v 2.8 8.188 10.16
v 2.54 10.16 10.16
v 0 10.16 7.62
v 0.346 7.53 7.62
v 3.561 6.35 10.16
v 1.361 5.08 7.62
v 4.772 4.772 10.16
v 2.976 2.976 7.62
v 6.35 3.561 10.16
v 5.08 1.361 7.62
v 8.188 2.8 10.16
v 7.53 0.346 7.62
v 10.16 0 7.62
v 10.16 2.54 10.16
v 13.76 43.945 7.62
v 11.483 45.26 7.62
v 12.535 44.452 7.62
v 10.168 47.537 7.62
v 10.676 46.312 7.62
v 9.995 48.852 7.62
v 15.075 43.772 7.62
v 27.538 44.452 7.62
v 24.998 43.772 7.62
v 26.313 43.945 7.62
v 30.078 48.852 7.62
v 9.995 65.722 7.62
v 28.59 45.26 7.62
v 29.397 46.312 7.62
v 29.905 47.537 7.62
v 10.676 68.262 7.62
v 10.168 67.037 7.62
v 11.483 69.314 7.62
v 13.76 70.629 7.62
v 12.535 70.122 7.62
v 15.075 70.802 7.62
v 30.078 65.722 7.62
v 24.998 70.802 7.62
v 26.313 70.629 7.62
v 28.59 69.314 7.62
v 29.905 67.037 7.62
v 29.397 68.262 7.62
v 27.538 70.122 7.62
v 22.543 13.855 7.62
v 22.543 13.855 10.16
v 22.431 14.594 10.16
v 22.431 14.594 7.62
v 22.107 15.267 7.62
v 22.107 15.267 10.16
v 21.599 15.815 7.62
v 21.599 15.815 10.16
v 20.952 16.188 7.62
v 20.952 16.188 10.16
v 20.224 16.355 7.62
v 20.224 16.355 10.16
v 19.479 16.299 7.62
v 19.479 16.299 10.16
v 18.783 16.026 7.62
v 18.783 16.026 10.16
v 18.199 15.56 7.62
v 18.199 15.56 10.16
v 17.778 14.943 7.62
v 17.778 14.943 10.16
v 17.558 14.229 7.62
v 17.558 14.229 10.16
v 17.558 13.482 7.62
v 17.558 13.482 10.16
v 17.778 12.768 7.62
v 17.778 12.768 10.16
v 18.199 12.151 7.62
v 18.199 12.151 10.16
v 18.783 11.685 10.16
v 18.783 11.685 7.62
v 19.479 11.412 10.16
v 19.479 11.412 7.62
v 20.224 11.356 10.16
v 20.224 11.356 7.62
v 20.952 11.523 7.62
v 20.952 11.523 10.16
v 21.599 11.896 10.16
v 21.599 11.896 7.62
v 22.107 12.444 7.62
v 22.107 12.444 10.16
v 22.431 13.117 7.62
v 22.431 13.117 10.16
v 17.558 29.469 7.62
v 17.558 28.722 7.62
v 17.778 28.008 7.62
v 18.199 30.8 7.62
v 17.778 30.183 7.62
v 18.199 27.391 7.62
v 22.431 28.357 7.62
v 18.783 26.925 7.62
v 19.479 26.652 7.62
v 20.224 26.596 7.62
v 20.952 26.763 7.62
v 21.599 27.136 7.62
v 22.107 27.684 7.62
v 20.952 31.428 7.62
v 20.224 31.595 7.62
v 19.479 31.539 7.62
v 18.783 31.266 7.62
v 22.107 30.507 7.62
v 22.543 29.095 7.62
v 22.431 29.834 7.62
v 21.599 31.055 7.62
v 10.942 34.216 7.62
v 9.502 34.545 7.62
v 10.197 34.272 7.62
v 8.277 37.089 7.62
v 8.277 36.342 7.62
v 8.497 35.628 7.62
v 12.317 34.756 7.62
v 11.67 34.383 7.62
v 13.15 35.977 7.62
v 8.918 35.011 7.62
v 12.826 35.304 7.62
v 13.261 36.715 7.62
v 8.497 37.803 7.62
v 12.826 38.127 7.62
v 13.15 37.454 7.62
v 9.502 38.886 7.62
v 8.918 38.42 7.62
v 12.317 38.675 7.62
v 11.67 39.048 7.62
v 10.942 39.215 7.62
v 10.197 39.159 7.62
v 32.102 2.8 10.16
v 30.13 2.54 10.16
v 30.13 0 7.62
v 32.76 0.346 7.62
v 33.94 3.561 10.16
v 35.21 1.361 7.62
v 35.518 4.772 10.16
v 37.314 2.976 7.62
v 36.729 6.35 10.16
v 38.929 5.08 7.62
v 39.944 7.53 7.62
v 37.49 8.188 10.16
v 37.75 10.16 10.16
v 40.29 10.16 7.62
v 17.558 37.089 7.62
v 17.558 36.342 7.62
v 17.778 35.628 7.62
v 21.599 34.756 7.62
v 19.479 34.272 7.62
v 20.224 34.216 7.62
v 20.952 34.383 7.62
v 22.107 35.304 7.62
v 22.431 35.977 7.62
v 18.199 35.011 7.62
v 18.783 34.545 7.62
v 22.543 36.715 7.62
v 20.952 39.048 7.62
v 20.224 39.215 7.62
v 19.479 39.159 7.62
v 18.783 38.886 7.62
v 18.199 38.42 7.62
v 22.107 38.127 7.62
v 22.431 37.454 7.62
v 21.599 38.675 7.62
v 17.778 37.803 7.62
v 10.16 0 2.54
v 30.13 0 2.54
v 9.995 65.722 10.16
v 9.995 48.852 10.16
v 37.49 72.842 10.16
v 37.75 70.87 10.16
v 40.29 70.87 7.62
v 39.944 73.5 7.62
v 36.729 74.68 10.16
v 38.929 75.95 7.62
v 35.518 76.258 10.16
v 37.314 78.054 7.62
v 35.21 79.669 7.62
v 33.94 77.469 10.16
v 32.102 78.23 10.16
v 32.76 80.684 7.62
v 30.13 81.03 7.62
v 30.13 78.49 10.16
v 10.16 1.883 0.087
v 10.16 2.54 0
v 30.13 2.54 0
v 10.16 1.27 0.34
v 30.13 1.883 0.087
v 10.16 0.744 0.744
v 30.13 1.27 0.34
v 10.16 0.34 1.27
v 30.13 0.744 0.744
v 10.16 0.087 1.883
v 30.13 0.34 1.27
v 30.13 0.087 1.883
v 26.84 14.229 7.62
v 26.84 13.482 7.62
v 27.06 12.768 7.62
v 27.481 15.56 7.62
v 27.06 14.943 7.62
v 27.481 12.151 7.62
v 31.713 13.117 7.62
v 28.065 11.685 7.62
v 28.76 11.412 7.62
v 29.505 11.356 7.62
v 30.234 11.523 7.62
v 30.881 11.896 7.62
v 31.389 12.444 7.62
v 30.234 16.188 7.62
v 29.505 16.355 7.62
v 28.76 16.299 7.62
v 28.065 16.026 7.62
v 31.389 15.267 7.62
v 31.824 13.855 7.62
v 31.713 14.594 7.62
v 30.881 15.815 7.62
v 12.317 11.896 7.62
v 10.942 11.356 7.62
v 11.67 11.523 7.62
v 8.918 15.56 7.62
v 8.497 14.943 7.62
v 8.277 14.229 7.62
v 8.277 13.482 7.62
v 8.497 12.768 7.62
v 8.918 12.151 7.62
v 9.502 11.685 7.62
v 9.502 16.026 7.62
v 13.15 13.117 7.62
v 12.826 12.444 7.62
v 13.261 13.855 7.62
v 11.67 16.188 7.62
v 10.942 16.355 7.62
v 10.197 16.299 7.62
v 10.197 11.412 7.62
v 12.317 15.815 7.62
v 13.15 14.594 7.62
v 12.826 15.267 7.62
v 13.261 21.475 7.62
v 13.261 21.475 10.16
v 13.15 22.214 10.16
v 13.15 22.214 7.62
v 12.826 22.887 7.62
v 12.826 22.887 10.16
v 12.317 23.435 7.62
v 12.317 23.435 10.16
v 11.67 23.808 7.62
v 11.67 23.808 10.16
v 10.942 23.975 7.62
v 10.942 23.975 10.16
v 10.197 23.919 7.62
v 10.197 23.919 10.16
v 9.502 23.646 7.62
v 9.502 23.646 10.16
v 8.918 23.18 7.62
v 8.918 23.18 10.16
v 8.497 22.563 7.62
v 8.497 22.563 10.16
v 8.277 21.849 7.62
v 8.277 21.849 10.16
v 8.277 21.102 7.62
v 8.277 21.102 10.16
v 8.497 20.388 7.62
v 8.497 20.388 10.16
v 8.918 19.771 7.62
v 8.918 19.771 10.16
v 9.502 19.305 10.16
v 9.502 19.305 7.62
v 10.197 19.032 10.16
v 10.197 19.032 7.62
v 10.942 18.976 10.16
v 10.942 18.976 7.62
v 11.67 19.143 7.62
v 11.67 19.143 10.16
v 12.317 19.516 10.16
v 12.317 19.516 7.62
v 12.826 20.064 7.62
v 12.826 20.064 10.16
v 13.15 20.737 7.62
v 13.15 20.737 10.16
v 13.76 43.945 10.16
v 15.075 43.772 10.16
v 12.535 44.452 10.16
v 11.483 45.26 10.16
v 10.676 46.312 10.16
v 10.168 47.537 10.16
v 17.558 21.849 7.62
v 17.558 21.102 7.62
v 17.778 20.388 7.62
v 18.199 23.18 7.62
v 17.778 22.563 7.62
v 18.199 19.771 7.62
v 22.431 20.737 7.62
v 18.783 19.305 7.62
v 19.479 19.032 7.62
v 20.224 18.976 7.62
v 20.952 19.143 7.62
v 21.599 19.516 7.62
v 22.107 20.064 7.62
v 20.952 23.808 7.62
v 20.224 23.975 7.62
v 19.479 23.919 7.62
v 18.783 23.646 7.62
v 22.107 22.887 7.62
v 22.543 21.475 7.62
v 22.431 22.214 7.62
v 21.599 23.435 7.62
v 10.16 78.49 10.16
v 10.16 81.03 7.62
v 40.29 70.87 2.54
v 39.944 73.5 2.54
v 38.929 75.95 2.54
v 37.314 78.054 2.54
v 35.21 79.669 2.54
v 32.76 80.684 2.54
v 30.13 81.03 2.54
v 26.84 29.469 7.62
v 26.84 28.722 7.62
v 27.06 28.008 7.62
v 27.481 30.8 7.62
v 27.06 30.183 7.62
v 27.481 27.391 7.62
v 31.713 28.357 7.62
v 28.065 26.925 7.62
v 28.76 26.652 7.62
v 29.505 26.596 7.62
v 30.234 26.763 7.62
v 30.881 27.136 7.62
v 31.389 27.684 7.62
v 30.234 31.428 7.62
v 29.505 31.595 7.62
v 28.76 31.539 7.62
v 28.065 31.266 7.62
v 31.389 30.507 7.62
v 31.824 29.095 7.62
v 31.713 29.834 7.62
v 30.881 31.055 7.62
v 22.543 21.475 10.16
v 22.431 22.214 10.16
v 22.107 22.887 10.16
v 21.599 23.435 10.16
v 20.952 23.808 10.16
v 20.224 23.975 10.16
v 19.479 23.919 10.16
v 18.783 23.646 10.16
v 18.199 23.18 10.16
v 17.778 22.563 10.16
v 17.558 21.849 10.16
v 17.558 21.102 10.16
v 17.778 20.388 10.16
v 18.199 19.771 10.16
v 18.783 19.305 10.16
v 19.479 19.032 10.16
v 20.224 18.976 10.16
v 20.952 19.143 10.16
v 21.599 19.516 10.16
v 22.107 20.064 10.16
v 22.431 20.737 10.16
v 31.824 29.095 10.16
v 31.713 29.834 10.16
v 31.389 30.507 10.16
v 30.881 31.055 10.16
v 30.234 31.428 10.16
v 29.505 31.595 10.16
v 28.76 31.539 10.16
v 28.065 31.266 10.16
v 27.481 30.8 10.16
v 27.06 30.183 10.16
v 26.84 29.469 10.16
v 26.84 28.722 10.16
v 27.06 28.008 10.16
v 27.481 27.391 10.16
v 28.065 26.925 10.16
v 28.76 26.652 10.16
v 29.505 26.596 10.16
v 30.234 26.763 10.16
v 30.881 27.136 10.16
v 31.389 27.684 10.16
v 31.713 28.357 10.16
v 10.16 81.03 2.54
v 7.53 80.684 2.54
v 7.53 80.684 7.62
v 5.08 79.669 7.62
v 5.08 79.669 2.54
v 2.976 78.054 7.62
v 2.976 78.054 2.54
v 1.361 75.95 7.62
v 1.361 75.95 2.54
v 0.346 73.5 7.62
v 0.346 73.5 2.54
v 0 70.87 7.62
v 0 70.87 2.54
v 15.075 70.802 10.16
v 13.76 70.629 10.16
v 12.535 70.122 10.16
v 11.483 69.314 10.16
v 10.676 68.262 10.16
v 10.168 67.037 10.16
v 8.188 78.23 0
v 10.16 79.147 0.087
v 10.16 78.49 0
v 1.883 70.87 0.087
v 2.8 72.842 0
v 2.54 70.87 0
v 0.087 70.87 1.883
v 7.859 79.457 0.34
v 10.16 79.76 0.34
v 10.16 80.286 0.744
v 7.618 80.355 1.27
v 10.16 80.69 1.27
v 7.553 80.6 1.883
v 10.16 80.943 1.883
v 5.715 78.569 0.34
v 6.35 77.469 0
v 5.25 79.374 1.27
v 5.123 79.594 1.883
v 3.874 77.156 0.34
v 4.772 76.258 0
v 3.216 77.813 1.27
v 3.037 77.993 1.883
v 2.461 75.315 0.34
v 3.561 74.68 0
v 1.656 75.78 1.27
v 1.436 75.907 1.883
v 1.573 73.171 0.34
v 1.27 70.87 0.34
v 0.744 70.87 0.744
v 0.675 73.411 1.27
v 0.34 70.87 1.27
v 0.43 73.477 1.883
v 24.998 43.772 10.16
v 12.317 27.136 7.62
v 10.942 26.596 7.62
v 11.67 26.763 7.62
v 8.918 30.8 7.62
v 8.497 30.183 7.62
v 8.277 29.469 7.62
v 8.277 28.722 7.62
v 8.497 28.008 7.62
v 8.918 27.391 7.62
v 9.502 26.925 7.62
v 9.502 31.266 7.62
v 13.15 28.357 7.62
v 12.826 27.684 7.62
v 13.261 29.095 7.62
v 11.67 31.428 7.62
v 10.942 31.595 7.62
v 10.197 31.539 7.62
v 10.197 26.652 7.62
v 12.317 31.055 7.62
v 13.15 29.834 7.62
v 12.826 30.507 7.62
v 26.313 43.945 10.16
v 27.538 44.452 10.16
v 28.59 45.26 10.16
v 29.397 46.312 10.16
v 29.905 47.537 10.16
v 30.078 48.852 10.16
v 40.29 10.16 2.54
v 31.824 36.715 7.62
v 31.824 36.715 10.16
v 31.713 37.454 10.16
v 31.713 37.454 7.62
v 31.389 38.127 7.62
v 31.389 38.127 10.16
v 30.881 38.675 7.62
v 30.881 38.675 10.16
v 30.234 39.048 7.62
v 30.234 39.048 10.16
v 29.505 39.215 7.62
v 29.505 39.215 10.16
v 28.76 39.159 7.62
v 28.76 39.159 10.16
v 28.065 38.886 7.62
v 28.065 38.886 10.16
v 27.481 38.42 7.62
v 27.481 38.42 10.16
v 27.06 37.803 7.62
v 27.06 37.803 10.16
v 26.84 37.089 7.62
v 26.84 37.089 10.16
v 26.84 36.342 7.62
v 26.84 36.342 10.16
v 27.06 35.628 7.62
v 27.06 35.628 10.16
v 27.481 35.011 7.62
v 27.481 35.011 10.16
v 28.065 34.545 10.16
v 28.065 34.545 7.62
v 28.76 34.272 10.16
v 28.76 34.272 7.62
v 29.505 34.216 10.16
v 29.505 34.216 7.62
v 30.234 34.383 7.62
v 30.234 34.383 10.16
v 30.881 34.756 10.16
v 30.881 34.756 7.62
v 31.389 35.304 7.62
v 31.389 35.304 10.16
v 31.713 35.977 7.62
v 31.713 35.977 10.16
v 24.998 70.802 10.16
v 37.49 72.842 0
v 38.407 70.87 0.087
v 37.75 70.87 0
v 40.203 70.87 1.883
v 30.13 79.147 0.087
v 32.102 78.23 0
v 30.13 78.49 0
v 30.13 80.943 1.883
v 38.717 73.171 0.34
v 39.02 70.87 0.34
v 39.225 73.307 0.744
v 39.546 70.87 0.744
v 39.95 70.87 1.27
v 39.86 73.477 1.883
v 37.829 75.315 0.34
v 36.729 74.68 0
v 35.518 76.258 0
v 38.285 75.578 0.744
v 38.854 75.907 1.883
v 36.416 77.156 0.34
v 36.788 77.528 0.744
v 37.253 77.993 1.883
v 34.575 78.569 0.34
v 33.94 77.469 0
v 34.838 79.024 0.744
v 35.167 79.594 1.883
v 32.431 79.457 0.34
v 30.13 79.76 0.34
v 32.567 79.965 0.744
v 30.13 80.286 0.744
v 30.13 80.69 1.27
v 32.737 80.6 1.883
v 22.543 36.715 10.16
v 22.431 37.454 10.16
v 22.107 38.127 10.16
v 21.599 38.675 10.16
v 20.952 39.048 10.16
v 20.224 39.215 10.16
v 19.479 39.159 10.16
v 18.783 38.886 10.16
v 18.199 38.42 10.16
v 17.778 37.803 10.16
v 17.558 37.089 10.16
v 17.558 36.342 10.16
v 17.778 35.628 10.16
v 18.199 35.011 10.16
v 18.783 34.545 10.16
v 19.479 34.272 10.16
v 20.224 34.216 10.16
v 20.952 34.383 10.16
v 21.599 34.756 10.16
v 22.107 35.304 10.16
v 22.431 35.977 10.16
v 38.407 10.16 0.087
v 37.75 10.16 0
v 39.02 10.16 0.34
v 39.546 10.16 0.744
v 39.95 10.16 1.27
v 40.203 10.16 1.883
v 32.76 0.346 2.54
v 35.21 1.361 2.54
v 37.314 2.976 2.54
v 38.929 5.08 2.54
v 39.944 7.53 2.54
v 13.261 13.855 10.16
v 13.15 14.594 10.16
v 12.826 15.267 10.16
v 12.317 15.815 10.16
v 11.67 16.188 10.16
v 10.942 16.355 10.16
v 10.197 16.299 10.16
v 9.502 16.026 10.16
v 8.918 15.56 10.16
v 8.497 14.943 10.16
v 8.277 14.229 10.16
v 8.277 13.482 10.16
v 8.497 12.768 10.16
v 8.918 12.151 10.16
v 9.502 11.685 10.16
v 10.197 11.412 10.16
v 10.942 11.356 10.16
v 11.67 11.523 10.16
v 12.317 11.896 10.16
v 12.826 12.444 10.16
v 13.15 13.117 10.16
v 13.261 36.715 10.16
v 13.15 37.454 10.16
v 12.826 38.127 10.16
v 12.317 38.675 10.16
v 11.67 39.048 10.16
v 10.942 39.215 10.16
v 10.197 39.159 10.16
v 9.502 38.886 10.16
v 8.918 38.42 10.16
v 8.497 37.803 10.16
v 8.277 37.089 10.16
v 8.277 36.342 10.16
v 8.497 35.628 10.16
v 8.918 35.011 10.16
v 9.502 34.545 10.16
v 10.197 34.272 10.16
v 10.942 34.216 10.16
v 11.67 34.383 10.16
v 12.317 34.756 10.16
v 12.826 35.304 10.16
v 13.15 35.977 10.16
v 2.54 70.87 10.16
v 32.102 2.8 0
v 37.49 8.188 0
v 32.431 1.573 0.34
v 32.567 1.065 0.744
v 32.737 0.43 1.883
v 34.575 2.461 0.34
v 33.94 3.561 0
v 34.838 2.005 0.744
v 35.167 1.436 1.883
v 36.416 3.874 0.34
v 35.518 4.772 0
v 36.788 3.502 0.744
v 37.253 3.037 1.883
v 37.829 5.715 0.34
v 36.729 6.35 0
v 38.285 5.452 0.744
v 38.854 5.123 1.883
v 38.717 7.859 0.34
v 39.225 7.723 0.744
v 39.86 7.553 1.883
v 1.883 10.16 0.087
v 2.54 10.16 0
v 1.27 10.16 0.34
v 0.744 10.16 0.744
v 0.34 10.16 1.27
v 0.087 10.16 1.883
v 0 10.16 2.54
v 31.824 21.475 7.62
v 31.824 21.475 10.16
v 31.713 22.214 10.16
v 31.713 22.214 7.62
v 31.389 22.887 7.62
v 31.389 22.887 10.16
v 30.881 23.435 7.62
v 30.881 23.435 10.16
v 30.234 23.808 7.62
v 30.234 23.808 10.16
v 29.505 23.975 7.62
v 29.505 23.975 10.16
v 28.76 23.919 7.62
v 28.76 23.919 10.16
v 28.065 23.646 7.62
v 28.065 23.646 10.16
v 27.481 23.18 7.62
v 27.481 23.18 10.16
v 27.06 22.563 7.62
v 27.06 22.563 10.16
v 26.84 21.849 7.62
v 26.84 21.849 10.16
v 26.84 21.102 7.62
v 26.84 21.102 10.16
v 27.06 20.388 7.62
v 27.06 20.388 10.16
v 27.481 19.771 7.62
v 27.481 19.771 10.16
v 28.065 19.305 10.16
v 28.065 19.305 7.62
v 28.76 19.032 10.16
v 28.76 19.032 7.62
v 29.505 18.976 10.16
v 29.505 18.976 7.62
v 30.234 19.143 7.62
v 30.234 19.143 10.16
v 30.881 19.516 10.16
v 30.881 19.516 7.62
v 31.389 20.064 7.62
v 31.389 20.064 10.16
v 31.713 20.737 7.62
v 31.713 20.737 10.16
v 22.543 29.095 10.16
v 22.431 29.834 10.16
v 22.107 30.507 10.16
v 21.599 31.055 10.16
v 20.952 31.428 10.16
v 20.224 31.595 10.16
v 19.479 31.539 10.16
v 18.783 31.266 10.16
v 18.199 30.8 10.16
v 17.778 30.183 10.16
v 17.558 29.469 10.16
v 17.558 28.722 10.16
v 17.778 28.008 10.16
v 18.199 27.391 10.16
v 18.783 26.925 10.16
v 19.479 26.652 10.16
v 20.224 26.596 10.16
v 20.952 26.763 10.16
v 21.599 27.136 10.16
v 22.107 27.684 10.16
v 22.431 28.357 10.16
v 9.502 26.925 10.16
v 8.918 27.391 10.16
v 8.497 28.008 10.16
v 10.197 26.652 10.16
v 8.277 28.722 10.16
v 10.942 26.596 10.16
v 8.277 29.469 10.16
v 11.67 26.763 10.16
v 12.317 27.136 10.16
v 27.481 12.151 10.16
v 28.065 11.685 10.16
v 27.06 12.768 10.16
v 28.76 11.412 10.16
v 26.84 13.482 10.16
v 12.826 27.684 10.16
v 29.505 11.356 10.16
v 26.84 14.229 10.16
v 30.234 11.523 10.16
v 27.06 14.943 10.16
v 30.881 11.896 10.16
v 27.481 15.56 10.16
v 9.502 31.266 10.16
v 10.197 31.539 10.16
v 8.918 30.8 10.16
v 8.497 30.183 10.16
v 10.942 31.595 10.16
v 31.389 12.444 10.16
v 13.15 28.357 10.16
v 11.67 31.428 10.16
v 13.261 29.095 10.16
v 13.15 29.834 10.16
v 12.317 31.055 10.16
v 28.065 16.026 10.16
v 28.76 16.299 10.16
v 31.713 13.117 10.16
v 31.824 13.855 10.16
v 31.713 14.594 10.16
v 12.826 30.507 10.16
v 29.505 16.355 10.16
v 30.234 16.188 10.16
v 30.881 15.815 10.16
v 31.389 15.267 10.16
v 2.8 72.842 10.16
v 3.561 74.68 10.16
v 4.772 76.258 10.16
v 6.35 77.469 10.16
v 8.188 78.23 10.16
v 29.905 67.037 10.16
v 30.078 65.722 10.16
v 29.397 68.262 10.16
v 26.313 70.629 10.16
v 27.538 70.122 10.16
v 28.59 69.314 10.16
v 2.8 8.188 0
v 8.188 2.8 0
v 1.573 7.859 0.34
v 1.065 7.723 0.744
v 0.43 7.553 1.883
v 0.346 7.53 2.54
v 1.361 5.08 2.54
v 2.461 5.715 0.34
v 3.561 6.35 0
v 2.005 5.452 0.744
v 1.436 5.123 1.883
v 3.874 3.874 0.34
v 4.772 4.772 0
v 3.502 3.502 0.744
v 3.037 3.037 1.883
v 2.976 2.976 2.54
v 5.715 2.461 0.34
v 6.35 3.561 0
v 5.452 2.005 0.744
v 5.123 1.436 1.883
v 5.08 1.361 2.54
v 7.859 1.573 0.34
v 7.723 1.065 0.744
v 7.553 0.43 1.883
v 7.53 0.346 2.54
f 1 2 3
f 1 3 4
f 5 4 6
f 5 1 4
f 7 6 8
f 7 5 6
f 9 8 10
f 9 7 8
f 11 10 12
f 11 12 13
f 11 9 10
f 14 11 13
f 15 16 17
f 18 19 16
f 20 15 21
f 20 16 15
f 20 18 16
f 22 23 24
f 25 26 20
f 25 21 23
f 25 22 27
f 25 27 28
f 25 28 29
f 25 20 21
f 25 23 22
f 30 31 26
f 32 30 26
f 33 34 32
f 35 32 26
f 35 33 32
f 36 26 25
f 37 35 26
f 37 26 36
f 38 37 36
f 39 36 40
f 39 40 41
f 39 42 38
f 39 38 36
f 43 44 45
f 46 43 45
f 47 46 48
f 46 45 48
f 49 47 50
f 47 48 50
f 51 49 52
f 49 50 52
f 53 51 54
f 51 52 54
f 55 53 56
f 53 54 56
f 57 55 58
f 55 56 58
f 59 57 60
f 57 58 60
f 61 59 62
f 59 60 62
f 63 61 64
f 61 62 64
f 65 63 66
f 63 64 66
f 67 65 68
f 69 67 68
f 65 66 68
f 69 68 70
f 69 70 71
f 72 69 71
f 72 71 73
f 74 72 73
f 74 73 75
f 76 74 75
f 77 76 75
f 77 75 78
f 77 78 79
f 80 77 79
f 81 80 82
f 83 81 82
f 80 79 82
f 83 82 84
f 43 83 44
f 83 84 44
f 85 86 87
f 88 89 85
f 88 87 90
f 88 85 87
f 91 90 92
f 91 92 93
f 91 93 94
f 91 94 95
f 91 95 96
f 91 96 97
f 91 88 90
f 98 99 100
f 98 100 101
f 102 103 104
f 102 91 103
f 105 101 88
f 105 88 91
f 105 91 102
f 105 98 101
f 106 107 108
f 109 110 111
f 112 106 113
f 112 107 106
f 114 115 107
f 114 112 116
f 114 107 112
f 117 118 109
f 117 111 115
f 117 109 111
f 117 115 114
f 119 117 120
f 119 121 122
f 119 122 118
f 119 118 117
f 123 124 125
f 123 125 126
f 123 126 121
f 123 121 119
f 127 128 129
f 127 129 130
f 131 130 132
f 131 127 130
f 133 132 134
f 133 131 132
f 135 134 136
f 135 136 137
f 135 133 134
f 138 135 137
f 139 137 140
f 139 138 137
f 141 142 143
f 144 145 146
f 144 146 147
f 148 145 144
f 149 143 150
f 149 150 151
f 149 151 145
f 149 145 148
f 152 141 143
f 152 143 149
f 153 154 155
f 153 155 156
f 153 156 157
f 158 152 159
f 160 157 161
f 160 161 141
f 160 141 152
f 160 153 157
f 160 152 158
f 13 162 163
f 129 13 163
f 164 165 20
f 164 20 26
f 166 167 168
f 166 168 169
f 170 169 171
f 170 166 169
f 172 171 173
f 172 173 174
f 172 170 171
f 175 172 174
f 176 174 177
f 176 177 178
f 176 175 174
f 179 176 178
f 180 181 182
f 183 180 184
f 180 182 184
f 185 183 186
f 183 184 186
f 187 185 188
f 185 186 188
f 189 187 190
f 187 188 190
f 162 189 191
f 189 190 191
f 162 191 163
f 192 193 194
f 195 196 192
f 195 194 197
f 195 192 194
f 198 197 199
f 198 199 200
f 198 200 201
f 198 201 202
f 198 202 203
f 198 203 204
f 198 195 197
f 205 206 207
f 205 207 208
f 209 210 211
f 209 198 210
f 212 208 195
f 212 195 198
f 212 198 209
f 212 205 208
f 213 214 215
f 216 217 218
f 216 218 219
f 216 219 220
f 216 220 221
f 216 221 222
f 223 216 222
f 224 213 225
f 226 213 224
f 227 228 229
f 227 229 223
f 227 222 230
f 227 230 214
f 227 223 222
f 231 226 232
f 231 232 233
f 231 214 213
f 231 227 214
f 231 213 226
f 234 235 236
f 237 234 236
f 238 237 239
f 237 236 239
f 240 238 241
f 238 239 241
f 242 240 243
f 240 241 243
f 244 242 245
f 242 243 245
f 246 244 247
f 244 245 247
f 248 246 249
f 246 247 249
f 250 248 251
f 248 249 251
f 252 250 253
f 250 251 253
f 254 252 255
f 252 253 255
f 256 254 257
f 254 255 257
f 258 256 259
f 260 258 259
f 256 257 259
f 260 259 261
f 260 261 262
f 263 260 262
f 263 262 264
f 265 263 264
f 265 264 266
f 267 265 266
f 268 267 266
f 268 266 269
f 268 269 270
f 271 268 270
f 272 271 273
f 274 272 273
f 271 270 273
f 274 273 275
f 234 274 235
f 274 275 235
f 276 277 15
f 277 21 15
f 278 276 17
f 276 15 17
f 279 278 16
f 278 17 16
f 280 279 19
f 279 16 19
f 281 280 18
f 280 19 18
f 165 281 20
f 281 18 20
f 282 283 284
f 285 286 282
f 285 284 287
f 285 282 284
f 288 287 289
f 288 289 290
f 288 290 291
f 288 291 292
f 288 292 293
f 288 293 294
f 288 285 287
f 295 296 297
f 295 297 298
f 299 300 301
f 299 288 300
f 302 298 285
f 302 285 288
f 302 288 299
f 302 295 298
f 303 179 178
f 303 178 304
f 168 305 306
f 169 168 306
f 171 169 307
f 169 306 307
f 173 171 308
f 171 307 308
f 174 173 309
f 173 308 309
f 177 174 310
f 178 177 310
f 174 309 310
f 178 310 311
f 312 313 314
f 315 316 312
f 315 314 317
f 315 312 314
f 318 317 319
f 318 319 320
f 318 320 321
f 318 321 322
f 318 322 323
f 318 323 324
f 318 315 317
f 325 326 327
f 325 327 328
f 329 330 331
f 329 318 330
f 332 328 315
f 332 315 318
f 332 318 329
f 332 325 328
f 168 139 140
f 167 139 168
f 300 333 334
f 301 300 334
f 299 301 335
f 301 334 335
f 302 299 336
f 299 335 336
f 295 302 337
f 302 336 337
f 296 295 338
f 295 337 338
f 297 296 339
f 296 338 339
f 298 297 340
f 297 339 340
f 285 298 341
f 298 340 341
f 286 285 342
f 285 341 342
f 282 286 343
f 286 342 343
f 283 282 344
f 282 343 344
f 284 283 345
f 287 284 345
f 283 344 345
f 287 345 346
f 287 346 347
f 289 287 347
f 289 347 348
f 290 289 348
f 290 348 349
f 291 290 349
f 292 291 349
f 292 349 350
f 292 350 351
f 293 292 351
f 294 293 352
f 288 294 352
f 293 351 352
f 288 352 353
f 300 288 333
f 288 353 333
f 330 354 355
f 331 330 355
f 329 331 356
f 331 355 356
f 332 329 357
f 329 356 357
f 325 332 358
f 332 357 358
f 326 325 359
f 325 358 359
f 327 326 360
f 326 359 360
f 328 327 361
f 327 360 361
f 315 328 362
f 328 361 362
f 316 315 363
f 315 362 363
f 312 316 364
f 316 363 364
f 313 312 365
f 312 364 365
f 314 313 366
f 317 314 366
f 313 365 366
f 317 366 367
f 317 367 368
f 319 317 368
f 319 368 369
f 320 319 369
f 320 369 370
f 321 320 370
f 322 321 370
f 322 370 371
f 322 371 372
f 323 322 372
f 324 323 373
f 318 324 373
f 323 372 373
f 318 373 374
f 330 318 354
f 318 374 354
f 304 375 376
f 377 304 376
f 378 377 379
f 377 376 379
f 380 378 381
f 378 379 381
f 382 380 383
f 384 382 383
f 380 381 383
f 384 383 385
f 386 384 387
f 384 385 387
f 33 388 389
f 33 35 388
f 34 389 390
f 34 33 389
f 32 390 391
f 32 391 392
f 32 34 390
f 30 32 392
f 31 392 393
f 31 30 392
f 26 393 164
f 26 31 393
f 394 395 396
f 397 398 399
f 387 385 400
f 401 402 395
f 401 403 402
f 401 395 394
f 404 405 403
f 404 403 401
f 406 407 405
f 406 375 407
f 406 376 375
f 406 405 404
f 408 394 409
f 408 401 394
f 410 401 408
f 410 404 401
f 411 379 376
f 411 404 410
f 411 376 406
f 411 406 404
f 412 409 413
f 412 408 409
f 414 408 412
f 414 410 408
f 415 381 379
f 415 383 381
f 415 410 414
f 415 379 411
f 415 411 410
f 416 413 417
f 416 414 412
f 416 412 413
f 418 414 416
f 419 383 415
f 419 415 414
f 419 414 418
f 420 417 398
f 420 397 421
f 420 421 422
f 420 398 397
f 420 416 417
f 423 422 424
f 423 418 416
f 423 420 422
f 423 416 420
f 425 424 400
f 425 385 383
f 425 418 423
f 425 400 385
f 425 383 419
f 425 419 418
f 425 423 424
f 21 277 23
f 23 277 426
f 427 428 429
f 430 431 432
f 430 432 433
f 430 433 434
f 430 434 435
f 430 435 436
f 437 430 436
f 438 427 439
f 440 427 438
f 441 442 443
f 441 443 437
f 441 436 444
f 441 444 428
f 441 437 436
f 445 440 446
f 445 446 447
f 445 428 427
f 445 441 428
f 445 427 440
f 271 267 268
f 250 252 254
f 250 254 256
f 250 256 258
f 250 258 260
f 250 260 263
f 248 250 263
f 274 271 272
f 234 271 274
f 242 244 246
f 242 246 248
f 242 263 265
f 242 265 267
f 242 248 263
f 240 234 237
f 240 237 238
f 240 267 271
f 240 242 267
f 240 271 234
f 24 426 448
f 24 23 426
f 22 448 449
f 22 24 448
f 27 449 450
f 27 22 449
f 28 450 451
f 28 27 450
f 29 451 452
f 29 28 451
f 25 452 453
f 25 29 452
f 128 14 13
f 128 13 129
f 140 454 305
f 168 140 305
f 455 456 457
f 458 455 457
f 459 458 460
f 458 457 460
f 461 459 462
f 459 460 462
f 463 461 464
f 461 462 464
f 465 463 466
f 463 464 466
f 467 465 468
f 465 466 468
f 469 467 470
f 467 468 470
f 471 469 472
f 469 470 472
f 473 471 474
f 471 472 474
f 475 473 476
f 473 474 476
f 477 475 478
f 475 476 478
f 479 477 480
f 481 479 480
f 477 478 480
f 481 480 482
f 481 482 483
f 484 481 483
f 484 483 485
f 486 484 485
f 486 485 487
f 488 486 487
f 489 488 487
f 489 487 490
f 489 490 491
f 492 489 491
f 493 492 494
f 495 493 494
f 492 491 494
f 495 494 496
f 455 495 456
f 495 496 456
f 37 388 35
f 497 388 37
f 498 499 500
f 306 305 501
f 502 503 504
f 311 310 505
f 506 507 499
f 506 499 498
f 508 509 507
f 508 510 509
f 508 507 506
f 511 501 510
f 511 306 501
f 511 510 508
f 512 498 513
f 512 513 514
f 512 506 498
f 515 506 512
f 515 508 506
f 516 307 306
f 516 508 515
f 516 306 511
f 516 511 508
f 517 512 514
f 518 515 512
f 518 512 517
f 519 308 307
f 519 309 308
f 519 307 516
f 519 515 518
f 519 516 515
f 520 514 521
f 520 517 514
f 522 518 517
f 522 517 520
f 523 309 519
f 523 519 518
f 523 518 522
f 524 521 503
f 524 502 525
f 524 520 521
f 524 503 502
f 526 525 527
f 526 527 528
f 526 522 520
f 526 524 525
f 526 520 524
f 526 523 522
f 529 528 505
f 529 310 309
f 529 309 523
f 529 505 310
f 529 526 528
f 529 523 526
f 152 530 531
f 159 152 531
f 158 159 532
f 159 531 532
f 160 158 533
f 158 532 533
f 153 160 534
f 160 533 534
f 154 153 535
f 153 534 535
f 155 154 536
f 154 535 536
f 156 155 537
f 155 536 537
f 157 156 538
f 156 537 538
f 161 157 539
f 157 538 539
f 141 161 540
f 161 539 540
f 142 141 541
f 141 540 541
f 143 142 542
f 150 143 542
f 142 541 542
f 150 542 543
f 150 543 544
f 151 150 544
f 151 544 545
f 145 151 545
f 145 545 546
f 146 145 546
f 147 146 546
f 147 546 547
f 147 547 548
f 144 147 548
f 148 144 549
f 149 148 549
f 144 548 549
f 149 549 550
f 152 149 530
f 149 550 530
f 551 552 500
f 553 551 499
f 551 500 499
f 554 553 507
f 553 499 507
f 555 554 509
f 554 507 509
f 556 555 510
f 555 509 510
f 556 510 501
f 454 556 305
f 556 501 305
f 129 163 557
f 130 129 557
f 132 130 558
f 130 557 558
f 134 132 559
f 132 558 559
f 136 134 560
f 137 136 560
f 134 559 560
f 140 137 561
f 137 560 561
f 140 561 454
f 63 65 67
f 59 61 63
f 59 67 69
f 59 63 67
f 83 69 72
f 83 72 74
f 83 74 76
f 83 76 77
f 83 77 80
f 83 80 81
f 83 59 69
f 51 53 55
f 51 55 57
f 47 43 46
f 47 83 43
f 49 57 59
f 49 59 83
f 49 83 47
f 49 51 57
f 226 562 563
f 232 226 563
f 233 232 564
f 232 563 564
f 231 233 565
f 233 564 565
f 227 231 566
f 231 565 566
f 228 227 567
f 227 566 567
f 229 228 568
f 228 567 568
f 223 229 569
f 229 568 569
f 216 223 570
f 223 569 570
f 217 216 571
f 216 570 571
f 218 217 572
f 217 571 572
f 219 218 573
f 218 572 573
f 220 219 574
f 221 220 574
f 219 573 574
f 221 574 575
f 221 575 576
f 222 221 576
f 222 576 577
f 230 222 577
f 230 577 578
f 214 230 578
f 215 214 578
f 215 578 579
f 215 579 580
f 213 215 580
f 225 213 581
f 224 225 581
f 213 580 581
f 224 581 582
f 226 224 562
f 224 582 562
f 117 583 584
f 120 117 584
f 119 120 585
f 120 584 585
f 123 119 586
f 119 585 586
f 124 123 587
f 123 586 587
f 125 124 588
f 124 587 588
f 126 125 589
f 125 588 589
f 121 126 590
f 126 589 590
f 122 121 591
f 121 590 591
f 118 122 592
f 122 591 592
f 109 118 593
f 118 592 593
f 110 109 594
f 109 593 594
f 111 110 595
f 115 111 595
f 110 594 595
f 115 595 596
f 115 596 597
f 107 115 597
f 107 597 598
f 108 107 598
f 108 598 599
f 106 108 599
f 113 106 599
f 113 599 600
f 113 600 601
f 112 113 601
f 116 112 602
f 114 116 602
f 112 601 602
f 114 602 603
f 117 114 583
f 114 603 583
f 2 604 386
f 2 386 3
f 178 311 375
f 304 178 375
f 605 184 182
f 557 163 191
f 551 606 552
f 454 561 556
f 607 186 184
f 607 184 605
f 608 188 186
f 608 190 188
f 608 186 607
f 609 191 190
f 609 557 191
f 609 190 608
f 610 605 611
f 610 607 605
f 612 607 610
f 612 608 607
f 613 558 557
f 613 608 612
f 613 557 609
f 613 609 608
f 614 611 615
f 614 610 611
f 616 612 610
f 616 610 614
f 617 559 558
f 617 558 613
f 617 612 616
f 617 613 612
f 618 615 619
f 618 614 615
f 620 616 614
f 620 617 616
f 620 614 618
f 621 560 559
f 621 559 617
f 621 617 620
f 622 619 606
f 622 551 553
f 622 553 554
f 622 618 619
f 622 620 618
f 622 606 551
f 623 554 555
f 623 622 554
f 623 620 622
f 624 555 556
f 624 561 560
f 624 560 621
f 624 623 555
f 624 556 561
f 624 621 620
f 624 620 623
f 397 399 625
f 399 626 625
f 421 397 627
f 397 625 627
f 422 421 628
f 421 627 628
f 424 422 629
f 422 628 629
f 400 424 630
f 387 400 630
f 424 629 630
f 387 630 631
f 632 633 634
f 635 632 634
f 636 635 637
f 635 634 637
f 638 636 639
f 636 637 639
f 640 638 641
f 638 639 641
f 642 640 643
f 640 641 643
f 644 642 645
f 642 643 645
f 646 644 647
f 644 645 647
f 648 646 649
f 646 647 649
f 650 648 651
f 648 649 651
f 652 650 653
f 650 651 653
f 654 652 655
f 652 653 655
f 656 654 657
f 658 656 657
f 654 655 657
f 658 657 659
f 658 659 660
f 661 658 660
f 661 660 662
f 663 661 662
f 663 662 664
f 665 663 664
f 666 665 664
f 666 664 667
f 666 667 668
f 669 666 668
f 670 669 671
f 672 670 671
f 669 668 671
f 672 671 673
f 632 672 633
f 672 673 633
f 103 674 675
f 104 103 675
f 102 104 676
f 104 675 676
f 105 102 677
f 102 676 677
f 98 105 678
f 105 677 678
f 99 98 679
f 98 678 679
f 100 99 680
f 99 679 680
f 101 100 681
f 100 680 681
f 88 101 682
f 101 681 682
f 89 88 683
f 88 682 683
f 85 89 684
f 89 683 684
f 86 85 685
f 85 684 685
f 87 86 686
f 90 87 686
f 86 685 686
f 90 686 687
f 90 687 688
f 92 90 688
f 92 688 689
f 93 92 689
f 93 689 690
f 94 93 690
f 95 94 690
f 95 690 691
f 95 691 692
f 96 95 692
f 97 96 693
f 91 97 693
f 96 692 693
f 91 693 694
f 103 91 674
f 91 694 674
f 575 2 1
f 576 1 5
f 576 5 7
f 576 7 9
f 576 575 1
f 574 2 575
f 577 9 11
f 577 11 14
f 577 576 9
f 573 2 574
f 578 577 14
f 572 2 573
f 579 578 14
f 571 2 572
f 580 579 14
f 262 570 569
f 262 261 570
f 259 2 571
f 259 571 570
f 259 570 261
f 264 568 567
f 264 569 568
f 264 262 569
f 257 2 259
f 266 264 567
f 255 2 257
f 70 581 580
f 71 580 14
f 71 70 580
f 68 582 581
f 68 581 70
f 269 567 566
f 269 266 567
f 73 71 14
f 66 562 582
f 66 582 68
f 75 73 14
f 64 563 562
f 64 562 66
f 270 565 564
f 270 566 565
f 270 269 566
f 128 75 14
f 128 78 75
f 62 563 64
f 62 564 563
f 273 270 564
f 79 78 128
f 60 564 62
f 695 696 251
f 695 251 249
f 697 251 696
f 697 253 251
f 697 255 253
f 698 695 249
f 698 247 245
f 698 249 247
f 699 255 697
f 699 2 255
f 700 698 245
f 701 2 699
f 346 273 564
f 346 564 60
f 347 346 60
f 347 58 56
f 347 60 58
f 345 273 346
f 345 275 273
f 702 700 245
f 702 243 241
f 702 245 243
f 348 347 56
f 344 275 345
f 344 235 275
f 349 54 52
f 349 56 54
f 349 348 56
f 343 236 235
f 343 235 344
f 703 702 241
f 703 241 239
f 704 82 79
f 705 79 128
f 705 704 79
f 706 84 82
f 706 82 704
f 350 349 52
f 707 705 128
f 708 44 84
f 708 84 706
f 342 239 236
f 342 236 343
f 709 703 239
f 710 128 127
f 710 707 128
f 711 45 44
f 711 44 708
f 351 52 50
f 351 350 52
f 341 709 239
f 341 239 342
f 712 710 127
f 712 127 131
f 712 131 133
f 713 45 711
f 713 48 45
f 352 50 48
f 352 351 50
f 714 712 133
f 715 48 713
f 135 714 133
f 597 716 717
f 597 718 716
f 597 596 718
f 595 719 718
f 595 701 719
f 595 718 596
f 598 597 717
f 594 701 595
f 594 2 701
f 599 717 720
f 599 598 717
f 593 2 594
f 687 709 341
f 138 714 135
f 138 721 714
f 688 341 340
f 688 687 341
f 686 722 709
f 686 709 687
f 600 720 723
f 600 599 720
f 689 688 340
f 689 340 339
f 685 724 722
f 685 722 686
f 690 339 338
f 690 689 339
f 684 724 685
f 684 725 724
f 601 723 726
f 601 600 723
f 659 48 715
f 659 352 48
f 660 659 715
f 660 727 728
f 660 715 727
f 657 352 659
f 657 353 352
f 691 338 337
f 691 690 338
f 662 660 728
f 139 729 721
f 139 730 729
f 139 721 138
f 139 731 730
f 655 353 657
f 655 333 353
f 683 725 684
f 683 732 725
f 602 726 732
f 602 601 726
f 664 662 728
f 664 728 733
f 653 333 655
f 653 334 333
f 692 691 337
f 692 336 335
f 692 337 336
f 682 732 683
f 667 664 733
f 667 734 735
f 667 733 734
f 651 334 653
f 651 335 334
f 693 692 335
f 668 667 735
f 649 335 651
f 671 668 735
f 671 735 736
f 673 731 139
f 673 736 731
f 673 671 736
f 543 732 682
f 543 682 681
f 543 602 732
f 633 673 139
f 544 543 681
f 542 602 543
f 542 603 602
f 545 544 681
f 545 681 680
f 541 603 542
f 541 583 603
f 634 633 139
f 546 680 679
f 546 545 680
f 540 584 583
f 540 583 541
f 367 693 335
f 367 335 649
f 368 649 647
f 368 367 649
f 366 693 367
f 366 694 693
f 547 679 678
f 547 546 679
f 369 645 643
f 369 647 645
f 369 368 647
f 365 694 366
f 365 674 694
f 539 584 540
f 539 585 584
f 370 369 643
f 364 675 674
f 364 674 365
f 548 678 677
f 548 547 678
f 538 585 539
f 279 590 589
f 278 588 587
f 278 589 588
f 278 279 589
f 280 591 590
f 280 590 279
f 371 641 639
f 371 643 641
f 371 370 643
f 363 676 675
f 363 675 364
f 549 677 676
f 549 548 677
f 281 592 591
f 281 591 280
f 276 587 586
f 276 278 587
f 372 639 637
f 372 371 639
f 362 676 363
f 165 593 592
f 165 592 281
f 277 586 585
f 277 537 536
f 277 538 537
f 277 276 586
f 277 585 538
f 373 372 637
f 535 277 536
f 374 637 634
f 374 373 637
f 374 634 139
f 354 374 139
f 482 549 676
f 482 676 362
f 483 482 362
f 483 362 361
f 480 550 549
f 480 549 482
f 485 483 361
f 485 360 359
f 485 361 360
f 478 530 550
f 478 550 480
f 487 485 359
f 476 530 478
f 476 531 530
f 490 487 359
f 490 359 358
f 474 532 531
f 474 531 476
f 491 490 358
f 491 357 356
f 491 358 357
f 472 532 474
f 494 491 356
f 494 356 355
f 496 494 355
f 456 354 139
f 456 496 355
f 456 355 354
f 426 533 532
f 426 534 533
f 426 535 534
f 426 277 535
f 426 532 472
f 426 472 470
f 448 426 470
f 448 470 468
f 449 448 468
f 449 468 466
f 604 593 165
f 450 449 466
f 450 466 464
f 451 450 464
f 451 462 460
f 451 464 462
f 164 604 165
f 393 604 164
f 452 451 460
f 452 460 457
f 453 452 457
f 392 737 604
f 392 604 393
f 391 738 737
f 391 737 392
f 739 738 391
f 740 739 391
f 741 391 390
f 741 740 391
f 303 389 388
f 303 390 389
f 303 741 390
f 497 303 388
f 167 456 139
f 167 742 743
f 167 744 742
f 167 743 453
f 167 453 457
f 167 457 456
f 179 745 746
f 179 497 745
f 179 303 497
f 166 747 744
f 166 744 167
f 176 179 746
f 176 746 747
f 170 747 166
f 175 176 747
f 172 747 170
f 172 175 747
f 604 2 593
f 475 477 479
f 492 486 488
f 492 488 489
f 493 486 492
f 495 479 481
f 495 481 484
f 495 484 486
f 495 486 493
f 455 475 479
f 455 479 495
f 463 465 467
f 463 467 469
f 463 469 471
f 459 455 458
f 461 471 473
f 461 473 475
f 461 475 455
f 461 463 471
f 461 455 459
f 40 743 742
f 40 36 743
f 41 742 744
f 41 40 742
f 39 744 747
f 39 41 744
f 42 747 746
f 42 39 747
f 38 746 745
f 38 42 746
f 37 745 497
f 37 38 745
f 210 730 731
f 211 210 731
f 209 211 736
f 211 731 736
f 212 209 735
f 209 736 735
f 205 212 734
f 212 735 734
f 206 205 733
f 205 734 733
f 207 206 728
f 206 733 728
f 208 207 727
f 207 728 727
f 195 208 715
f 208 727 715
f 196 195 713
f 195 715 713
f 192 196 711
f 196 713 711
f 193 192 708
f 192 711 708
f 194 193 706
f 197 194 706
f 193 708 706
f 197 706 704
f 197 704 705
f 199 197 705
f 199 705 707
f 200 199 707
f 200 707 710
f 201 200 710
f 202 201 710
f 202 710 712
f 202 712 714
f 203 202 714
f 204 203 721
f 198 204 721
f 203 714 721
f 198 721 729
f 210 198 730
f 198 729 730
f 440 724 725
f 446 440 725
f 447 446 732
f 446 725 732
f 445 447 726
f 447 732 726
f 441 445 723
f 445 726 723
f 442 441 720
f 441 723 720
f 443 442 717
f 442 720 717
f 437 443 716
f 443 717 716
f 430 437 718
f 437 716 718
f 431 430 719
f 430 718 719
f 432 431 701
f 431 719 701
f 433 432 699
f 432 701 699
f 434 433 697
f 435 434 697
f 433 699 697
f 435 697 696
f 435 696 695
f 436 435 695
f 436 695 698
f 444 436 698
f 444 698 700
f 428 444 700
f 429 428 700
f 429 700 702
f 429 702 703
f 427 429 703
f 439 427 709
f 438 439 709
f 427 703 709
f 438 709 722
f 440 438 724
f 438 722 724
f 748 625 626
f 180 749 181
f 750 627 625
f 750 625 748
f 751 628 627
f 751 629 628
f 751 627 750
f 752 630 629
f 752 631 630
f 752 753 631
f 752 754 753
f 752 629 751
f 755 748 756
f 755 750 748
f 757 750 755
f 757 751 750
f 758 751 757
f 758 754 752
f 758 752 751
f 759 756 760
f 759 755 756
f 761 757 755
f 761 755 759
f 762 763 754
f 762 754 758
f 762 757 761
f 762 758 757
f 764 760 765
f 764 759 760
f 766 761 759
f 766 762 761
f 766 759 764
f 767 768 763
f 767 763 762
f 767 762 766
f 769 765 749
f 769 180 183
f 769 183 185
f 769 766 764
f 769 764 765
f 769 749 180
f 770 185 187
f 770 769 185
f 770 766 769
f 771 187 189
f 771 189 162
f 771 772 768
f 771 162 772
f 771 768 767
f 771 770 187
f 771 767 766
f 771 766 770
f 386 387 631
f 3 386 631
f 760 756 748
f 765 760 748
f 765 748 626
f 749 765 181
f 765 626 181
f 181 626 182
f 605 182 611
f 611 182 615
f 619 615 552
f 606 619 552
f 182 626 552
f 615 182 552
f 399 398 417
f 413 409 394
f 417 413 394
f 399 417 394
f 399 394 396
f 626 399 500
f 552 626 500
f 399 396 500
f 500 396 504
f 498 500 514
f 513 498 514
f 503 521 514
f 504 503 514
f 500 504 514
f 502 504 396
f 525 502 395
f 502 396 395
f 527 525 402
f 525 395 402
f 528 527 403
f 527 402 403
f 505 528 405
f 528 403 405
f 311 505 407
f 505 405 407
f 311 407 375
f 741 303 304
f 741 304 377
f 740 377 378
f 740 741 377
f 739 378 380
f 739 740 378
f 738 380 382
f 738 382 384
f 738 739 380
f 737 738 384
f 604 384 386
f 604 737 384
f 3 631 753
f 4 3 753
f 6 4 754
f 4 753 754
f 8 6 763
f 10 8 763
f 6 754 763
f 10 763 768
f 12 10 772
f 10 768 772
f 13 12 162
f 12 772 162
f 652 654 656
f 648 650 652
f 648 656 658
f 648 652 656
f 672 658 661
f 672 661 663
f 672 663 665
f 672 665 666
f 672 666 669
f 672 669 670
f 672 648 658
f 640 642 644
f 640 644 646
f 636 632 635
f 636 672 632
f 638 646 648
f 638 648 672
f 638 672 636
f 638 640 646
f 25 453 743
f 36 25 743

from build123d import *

# Parameters (mm, degrees)
EXTRUDE1_DEPTH = 10.16
CHAMFER1_SIZE  = 2.54
FILLET1_R      = 2.54
SKETCH2_R      = 2.50622178
SKETCH2_W      = 20.082955398
SKETCH2_H      = 27.0305724
EXTRUDE2_DEPTH = 2.54
FILLET2_R      = 5.08


with BuildPart() as part:
    # Sketch1 → Extrude1 (new body)
    with BuildSketch(Plane.XY):
        with BuildLine():
            Line((10.16, 0), (30.130017372, 0))
            ThreePointArc((30.130017372, 0), (37.314222268, 2.975795103), (40.290017372, 10.16))
            Line((40.290017372, 10.16), (40.290017372, 70.869919512))
            ThreePointArc((40.290017372, 70.869919512), (37.314222268, 78.054124409), (30.130017372, 81.029919512))
            Line((30.130017372, 81.029919512), (10.16, 81.029919512))
            ThreePointArc((10.16, 81.029919512), (2.975795103, 78.054124409), (0, 70.869919512))
            Line((0, 70.869919512), (0, 10.16))
            ThreePointArc((0, 10.16), (2.975795103, 2.975795103), (10.16, 0))
        make_face()
    extrude(amount=EXTRUDE1_DEPTH)

    # Chamfer1
    chamfer1_edges = [part.edges().sort_by_distance(p)[0] for p in [
        (2.975795103, 2.975795103, 10.16),
        (20.145008686, 0, 10.16),
        (37.314222268, 2.975795103, 10.16),
        (40.290017372, 40.514959756, 10.16),
        (37.314222268, 78.054124409, 10.16),
        (20.145008686, 81.029919512, 10.16),
        (2.975795103, 78.054124409, 10.16),
        (0, 40.514959756, 10.16),
    ]]
    chamfer(chamfer1_edges, length=CHAMFER1_SIZE)

    # Fillet1
    fillet1_edges = [part.edges().sort_by_distance(p)[0] for p in [
        (0, 40.514959756, 0),
        (2.975795103, 78.054124409, 0),
        (20.145008686, 81.029919512, 0),
        (37.314222268, 78.054124409, 0),
        (40.290017372, 40.514959756, 0),
        (37.314222268, 2.975795103, 0),
        (20.145008686, 0, 0),
        (2.975795103, 2.975795103, 0),
    ]]
    fillet(fillet1_edges, radius=FILLET1_R)

    # Sketch2 → Extrude2 (cut)
    with BuildSketch(Plane.XY.offset(10.16)):
        with Locations((10.754870081, 36.715481708)):
            Circle(SKETCH2_R)
        with Locations((20.03645217, 36.715481708)):
            Circle(SKETCH2_R)
        with Locations((29.318034259, 36.715481708)):
            Circle(SKETCH2_R)
        with Locations((10.754870081, 29.095481708)):
            Circle(SKETCH2_R)
        with Locations((20.03645217, 29.095481708)):
            Circle(SKETCH2_R)
        with Locations((29.318034259, 29.095481708)):
            Circle(SKETCH2_R)
        with Locations((10.754870081, 21.475481708)):
            Circle(SKETCH2_R)
        with Locations((20.03645217, 21.475481708)):
            Circle(SKETCH2_R)
        with Locations((29.318034259, 21.475481708)):
            Circle(SKETCH2_R)
        with Locations((10.754870081, 13.855481708)):
            Circle(SKETCH2_R)
        with Locations((20.03645217, 13.855481708)):
            Circle(SKETCH2_R)
        with Locations((29.318034259, 13.855481708)):
            Circle(SKETCH2_R)
        with Locations((20.03645217, 57.286941426)):
            Rectangle(SKETCH2_W, SKETCH2_H)
    extrude(amount=-EXTRUDE2_DEPTH, mode=Mode.SUBTRACT)

    # Fillet2
    fillet2_edges = [part.edges().sort_by_distance(p)[0] for p in [
        (9.994974471, 43.771655226, 8.89),
        (9.994974471, 70.802227626, 8.89),
        (30.077929869, 70.802227626, 8.89),
        (30.077929869, 43.771655226, 8.89),
    ]]
    fillet(fillet2_edges, radius=FILLET2_R)


solid = part.part
